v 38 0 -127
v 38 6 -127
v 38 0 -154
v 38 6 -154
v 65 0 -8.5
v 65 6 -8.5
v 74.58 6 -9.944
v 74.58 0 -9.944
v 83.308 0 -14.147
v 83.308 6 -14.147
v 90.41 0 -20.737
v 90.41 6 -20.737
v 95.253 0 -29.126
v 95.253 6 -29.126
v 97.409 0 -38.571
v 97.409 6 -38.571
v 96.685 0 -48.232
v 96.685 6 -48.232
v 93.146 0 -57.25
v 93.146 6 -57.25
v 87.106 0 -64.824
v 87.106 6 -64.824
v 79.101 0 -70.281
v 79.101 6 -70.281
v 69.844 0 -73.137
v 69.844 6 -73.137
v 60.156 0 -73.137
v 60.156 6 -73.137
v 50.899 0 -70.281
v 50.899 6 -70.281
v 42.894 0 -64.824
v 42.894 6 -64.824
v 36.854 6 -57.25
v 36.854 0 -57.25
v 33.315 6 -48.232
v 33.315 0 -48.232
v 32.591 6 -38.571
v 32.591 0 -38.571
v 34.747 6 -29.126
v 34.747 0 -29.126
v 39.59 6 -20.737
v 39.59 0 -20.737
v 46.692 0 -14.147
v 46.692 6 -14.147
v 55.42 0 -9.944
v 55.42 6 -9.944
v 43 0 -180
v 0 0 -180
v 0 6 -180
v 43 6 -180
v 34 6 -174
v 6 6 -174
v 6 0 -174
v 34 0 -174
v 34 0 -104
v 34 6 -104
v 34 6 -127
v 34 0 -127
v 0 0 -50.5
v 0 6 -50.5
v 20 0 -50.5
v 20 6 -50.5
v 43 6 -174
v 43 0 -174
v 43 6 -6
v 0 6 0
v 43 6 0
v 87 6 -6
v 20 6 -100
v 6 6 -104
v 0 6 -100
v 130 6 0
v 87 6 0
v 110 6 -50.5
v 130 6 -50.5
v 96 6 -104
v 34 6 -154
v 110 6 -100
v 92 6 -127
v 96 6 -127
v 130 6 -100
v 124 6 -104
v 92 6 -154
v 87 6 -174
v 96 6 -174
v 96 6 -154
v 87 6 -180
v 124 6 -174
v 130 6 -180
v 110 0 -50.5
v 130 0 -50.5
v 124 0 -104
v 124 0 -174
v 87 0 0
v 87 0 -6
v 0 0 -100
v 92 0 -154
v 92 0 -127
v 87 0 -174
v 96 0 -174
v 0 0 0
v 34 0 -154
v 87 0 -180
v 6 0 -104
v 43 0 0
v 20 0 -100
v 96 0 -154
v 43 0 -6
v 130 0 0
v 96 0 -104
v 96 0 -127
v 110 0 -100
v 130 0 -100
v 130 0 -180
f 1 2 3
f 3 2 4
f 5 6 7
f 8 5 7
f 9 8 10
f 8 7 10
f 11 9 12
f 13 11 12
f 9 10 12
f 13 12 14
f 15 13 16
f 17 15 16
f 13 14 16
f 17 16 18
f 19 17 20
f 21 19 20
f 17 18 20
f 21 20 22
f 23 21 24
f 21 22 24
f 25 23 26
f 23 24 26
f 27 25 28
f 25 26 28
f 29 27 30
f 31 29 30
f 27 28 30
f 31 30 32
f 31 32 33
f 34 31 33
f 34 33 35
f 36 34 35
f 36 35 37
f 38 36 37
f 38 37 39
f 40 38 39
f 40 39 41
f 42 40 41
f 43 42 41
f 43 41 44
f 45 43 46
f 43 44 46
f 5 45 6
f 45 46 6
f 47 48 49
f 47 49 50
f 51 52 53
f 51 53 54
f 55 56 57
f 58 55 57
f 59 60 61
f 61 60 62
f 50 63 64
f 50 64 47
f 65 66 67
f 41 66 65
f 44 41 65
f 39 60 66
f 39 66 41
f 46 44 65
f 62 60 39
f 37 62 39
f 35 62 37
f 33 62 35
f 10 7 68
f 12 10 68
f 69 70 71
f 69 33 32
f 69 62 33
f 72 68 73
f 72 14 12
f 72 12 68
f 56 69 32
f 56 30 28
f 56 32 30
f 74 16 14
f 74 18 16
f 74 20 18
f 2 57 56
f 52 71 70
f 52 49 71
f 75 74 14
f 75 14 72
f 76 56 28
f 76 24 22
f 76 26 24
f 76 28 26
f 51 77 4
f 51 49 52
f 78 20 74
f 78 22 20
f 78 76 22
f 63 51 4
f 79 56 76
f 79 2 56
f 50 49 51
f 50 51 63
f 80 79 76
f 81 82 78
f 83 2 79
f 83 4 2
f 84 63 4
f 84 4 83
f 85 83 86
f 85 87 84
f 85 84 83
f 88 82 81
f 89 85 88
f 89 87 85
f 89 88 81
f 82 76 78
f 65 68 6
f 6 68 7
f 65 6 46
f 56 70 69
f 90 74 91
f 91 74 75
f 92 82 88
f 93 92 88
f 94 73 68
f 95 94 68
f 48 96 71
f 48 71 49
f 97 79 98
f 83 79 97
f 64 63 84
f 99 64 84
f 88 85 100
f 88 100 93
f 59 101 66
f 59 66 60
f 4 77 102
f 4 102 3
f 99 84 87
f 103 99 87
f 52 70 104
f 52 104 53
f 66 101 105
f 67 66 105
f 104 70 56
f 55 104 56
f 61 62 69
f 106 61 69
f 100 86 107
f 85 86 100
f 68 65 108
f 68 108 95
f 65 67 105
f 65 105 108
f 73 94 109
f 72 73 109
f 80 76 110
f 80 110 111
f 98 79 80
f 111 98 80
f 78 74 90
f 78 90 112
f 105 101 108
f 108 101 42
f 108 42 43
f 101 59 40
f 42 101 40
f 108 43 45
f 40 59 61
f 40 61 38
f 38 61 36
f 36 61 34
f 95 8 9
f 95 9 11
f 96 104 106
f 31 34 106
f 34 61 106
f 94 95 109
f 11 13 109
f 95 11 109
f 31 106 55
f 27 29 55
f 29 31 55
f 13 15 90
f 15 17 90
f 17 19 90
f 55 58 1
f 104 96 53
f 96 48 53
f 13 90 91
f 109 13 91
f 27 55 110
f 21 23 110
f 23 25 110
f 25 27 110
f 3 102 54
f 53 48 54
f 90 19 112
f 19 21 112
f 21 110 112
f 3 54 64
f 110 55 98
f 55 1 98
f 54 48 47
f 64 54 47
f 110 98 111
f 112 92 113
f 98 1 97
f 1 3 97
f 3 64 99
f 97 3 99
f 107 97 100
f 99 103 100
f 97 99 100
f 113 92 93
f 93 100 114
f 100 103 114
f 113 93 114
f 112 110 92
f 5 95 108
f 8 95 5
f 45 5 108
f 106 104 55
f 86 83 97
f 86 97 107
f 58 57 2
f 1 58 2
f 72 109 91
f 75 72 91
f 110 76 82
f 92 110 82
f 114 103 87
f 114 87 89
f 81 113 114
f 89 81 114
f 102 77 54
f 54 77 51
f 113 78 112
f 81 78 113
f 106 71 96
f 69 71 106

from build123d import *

# Parameters (mm, degrees)
SKETCH1_W           = 130
SKETCH1_H           = 180
BOSS_EXTRUDE1_DEPTH = 6
SKETCH2_R           = 32.5
SKETCH2_W           = 28
SKETCH2_H           = 70
CUT_EXTRUDE2_DEPTH  = 6
SKETCH3_W           = 20
SKETCH3_H           = 49.5
CUT_EXTRUDE3_DEPTH  = 223.117086241
SKETCH4_W           = 44
SKETCH4_H           = 6
SKETCH4_W_2         = 4
SKETCH4_H_2         = 27
CUT_EXTRUDE4_DEPTH  = 223.117086241


with BuildPart() as part:
    # Sketch1 → Boss-Extrude1 (new body)
    with BuildSketch(Plane(origin=(0, 0, 0), x_dir=(1, 0, 0), z_dir=(0, 1, 0))):
        with Locations((65, 90)):
            Rectangle(SKETCH1_W, SKETCH1_H)
    extrude(amount=BOSS_EXTRUDE1_DEPTH)

    # Sketch2 → Cut-Extrude2 (cut)
    with BuildSketch(Plane(origin=(0, 6, 0), x_dir=(1, 0, 0), z_dir=(0, 1, 0))):
        with Locations(Location((65, 41, 0), (0, 0, 270))):
            Circle(SKETCH2_R)
        with Locations((20, 139)):
            Rectangle(SKETCH2_W, SKETCH2_H)
        with Locations((110, 139)):
            Rectangle(SKETCH2_W, SKETCH2_H)
    extrude(amount=-CUT_EXTRUDE2_DEPTH, mode=Mode.SUBTRACT)

    # Sketch3 → Cut-Extrude3 (cut, through all)
    with BuildSketch(Plane(origin=(0, 6, 0), x_dir=(1, 0, 0), z_dir=(0, 1, 0))):
        with Locations((120, 75.25)):
            Rectangle(SKETCH3_W, SKETCH3_H)
        with Locations((10, 75.25)):
            Rectangle(SKETCH3_W, SKETCH3_H)
    extrude(amount=-CUT_EXTRUDE3_DEPTH, mode=Mode.SUBTRACT)

    # Sketch4 → Cut-Extrude4 (cut, through all)
    with BuildSketch(Plane(origin=(0, 6, 0), x_dir=(1, 0, 0), z_dir=(0, 1, 0))):
        with Locations((65, 177)):
            Rectangle(SKETCH4_W, SKETCH4_H)
        with Locations((36, 140.5)):
            Rectangle(SKETCH4_W_2, SKETCH4_H_2)
        with Locations((94, 140.5)):
            Rectangle(SKETCH4_W_2, SKETCH4_H_2)
        with Locations((65, 3)):
            Rectangle(SKETCH4_W, SKETCH4_H)
    extrude(amount=-CUT_EXTRUDE4_DEPTH, mode=Mode.SUBTRACT)


solid = part.part
